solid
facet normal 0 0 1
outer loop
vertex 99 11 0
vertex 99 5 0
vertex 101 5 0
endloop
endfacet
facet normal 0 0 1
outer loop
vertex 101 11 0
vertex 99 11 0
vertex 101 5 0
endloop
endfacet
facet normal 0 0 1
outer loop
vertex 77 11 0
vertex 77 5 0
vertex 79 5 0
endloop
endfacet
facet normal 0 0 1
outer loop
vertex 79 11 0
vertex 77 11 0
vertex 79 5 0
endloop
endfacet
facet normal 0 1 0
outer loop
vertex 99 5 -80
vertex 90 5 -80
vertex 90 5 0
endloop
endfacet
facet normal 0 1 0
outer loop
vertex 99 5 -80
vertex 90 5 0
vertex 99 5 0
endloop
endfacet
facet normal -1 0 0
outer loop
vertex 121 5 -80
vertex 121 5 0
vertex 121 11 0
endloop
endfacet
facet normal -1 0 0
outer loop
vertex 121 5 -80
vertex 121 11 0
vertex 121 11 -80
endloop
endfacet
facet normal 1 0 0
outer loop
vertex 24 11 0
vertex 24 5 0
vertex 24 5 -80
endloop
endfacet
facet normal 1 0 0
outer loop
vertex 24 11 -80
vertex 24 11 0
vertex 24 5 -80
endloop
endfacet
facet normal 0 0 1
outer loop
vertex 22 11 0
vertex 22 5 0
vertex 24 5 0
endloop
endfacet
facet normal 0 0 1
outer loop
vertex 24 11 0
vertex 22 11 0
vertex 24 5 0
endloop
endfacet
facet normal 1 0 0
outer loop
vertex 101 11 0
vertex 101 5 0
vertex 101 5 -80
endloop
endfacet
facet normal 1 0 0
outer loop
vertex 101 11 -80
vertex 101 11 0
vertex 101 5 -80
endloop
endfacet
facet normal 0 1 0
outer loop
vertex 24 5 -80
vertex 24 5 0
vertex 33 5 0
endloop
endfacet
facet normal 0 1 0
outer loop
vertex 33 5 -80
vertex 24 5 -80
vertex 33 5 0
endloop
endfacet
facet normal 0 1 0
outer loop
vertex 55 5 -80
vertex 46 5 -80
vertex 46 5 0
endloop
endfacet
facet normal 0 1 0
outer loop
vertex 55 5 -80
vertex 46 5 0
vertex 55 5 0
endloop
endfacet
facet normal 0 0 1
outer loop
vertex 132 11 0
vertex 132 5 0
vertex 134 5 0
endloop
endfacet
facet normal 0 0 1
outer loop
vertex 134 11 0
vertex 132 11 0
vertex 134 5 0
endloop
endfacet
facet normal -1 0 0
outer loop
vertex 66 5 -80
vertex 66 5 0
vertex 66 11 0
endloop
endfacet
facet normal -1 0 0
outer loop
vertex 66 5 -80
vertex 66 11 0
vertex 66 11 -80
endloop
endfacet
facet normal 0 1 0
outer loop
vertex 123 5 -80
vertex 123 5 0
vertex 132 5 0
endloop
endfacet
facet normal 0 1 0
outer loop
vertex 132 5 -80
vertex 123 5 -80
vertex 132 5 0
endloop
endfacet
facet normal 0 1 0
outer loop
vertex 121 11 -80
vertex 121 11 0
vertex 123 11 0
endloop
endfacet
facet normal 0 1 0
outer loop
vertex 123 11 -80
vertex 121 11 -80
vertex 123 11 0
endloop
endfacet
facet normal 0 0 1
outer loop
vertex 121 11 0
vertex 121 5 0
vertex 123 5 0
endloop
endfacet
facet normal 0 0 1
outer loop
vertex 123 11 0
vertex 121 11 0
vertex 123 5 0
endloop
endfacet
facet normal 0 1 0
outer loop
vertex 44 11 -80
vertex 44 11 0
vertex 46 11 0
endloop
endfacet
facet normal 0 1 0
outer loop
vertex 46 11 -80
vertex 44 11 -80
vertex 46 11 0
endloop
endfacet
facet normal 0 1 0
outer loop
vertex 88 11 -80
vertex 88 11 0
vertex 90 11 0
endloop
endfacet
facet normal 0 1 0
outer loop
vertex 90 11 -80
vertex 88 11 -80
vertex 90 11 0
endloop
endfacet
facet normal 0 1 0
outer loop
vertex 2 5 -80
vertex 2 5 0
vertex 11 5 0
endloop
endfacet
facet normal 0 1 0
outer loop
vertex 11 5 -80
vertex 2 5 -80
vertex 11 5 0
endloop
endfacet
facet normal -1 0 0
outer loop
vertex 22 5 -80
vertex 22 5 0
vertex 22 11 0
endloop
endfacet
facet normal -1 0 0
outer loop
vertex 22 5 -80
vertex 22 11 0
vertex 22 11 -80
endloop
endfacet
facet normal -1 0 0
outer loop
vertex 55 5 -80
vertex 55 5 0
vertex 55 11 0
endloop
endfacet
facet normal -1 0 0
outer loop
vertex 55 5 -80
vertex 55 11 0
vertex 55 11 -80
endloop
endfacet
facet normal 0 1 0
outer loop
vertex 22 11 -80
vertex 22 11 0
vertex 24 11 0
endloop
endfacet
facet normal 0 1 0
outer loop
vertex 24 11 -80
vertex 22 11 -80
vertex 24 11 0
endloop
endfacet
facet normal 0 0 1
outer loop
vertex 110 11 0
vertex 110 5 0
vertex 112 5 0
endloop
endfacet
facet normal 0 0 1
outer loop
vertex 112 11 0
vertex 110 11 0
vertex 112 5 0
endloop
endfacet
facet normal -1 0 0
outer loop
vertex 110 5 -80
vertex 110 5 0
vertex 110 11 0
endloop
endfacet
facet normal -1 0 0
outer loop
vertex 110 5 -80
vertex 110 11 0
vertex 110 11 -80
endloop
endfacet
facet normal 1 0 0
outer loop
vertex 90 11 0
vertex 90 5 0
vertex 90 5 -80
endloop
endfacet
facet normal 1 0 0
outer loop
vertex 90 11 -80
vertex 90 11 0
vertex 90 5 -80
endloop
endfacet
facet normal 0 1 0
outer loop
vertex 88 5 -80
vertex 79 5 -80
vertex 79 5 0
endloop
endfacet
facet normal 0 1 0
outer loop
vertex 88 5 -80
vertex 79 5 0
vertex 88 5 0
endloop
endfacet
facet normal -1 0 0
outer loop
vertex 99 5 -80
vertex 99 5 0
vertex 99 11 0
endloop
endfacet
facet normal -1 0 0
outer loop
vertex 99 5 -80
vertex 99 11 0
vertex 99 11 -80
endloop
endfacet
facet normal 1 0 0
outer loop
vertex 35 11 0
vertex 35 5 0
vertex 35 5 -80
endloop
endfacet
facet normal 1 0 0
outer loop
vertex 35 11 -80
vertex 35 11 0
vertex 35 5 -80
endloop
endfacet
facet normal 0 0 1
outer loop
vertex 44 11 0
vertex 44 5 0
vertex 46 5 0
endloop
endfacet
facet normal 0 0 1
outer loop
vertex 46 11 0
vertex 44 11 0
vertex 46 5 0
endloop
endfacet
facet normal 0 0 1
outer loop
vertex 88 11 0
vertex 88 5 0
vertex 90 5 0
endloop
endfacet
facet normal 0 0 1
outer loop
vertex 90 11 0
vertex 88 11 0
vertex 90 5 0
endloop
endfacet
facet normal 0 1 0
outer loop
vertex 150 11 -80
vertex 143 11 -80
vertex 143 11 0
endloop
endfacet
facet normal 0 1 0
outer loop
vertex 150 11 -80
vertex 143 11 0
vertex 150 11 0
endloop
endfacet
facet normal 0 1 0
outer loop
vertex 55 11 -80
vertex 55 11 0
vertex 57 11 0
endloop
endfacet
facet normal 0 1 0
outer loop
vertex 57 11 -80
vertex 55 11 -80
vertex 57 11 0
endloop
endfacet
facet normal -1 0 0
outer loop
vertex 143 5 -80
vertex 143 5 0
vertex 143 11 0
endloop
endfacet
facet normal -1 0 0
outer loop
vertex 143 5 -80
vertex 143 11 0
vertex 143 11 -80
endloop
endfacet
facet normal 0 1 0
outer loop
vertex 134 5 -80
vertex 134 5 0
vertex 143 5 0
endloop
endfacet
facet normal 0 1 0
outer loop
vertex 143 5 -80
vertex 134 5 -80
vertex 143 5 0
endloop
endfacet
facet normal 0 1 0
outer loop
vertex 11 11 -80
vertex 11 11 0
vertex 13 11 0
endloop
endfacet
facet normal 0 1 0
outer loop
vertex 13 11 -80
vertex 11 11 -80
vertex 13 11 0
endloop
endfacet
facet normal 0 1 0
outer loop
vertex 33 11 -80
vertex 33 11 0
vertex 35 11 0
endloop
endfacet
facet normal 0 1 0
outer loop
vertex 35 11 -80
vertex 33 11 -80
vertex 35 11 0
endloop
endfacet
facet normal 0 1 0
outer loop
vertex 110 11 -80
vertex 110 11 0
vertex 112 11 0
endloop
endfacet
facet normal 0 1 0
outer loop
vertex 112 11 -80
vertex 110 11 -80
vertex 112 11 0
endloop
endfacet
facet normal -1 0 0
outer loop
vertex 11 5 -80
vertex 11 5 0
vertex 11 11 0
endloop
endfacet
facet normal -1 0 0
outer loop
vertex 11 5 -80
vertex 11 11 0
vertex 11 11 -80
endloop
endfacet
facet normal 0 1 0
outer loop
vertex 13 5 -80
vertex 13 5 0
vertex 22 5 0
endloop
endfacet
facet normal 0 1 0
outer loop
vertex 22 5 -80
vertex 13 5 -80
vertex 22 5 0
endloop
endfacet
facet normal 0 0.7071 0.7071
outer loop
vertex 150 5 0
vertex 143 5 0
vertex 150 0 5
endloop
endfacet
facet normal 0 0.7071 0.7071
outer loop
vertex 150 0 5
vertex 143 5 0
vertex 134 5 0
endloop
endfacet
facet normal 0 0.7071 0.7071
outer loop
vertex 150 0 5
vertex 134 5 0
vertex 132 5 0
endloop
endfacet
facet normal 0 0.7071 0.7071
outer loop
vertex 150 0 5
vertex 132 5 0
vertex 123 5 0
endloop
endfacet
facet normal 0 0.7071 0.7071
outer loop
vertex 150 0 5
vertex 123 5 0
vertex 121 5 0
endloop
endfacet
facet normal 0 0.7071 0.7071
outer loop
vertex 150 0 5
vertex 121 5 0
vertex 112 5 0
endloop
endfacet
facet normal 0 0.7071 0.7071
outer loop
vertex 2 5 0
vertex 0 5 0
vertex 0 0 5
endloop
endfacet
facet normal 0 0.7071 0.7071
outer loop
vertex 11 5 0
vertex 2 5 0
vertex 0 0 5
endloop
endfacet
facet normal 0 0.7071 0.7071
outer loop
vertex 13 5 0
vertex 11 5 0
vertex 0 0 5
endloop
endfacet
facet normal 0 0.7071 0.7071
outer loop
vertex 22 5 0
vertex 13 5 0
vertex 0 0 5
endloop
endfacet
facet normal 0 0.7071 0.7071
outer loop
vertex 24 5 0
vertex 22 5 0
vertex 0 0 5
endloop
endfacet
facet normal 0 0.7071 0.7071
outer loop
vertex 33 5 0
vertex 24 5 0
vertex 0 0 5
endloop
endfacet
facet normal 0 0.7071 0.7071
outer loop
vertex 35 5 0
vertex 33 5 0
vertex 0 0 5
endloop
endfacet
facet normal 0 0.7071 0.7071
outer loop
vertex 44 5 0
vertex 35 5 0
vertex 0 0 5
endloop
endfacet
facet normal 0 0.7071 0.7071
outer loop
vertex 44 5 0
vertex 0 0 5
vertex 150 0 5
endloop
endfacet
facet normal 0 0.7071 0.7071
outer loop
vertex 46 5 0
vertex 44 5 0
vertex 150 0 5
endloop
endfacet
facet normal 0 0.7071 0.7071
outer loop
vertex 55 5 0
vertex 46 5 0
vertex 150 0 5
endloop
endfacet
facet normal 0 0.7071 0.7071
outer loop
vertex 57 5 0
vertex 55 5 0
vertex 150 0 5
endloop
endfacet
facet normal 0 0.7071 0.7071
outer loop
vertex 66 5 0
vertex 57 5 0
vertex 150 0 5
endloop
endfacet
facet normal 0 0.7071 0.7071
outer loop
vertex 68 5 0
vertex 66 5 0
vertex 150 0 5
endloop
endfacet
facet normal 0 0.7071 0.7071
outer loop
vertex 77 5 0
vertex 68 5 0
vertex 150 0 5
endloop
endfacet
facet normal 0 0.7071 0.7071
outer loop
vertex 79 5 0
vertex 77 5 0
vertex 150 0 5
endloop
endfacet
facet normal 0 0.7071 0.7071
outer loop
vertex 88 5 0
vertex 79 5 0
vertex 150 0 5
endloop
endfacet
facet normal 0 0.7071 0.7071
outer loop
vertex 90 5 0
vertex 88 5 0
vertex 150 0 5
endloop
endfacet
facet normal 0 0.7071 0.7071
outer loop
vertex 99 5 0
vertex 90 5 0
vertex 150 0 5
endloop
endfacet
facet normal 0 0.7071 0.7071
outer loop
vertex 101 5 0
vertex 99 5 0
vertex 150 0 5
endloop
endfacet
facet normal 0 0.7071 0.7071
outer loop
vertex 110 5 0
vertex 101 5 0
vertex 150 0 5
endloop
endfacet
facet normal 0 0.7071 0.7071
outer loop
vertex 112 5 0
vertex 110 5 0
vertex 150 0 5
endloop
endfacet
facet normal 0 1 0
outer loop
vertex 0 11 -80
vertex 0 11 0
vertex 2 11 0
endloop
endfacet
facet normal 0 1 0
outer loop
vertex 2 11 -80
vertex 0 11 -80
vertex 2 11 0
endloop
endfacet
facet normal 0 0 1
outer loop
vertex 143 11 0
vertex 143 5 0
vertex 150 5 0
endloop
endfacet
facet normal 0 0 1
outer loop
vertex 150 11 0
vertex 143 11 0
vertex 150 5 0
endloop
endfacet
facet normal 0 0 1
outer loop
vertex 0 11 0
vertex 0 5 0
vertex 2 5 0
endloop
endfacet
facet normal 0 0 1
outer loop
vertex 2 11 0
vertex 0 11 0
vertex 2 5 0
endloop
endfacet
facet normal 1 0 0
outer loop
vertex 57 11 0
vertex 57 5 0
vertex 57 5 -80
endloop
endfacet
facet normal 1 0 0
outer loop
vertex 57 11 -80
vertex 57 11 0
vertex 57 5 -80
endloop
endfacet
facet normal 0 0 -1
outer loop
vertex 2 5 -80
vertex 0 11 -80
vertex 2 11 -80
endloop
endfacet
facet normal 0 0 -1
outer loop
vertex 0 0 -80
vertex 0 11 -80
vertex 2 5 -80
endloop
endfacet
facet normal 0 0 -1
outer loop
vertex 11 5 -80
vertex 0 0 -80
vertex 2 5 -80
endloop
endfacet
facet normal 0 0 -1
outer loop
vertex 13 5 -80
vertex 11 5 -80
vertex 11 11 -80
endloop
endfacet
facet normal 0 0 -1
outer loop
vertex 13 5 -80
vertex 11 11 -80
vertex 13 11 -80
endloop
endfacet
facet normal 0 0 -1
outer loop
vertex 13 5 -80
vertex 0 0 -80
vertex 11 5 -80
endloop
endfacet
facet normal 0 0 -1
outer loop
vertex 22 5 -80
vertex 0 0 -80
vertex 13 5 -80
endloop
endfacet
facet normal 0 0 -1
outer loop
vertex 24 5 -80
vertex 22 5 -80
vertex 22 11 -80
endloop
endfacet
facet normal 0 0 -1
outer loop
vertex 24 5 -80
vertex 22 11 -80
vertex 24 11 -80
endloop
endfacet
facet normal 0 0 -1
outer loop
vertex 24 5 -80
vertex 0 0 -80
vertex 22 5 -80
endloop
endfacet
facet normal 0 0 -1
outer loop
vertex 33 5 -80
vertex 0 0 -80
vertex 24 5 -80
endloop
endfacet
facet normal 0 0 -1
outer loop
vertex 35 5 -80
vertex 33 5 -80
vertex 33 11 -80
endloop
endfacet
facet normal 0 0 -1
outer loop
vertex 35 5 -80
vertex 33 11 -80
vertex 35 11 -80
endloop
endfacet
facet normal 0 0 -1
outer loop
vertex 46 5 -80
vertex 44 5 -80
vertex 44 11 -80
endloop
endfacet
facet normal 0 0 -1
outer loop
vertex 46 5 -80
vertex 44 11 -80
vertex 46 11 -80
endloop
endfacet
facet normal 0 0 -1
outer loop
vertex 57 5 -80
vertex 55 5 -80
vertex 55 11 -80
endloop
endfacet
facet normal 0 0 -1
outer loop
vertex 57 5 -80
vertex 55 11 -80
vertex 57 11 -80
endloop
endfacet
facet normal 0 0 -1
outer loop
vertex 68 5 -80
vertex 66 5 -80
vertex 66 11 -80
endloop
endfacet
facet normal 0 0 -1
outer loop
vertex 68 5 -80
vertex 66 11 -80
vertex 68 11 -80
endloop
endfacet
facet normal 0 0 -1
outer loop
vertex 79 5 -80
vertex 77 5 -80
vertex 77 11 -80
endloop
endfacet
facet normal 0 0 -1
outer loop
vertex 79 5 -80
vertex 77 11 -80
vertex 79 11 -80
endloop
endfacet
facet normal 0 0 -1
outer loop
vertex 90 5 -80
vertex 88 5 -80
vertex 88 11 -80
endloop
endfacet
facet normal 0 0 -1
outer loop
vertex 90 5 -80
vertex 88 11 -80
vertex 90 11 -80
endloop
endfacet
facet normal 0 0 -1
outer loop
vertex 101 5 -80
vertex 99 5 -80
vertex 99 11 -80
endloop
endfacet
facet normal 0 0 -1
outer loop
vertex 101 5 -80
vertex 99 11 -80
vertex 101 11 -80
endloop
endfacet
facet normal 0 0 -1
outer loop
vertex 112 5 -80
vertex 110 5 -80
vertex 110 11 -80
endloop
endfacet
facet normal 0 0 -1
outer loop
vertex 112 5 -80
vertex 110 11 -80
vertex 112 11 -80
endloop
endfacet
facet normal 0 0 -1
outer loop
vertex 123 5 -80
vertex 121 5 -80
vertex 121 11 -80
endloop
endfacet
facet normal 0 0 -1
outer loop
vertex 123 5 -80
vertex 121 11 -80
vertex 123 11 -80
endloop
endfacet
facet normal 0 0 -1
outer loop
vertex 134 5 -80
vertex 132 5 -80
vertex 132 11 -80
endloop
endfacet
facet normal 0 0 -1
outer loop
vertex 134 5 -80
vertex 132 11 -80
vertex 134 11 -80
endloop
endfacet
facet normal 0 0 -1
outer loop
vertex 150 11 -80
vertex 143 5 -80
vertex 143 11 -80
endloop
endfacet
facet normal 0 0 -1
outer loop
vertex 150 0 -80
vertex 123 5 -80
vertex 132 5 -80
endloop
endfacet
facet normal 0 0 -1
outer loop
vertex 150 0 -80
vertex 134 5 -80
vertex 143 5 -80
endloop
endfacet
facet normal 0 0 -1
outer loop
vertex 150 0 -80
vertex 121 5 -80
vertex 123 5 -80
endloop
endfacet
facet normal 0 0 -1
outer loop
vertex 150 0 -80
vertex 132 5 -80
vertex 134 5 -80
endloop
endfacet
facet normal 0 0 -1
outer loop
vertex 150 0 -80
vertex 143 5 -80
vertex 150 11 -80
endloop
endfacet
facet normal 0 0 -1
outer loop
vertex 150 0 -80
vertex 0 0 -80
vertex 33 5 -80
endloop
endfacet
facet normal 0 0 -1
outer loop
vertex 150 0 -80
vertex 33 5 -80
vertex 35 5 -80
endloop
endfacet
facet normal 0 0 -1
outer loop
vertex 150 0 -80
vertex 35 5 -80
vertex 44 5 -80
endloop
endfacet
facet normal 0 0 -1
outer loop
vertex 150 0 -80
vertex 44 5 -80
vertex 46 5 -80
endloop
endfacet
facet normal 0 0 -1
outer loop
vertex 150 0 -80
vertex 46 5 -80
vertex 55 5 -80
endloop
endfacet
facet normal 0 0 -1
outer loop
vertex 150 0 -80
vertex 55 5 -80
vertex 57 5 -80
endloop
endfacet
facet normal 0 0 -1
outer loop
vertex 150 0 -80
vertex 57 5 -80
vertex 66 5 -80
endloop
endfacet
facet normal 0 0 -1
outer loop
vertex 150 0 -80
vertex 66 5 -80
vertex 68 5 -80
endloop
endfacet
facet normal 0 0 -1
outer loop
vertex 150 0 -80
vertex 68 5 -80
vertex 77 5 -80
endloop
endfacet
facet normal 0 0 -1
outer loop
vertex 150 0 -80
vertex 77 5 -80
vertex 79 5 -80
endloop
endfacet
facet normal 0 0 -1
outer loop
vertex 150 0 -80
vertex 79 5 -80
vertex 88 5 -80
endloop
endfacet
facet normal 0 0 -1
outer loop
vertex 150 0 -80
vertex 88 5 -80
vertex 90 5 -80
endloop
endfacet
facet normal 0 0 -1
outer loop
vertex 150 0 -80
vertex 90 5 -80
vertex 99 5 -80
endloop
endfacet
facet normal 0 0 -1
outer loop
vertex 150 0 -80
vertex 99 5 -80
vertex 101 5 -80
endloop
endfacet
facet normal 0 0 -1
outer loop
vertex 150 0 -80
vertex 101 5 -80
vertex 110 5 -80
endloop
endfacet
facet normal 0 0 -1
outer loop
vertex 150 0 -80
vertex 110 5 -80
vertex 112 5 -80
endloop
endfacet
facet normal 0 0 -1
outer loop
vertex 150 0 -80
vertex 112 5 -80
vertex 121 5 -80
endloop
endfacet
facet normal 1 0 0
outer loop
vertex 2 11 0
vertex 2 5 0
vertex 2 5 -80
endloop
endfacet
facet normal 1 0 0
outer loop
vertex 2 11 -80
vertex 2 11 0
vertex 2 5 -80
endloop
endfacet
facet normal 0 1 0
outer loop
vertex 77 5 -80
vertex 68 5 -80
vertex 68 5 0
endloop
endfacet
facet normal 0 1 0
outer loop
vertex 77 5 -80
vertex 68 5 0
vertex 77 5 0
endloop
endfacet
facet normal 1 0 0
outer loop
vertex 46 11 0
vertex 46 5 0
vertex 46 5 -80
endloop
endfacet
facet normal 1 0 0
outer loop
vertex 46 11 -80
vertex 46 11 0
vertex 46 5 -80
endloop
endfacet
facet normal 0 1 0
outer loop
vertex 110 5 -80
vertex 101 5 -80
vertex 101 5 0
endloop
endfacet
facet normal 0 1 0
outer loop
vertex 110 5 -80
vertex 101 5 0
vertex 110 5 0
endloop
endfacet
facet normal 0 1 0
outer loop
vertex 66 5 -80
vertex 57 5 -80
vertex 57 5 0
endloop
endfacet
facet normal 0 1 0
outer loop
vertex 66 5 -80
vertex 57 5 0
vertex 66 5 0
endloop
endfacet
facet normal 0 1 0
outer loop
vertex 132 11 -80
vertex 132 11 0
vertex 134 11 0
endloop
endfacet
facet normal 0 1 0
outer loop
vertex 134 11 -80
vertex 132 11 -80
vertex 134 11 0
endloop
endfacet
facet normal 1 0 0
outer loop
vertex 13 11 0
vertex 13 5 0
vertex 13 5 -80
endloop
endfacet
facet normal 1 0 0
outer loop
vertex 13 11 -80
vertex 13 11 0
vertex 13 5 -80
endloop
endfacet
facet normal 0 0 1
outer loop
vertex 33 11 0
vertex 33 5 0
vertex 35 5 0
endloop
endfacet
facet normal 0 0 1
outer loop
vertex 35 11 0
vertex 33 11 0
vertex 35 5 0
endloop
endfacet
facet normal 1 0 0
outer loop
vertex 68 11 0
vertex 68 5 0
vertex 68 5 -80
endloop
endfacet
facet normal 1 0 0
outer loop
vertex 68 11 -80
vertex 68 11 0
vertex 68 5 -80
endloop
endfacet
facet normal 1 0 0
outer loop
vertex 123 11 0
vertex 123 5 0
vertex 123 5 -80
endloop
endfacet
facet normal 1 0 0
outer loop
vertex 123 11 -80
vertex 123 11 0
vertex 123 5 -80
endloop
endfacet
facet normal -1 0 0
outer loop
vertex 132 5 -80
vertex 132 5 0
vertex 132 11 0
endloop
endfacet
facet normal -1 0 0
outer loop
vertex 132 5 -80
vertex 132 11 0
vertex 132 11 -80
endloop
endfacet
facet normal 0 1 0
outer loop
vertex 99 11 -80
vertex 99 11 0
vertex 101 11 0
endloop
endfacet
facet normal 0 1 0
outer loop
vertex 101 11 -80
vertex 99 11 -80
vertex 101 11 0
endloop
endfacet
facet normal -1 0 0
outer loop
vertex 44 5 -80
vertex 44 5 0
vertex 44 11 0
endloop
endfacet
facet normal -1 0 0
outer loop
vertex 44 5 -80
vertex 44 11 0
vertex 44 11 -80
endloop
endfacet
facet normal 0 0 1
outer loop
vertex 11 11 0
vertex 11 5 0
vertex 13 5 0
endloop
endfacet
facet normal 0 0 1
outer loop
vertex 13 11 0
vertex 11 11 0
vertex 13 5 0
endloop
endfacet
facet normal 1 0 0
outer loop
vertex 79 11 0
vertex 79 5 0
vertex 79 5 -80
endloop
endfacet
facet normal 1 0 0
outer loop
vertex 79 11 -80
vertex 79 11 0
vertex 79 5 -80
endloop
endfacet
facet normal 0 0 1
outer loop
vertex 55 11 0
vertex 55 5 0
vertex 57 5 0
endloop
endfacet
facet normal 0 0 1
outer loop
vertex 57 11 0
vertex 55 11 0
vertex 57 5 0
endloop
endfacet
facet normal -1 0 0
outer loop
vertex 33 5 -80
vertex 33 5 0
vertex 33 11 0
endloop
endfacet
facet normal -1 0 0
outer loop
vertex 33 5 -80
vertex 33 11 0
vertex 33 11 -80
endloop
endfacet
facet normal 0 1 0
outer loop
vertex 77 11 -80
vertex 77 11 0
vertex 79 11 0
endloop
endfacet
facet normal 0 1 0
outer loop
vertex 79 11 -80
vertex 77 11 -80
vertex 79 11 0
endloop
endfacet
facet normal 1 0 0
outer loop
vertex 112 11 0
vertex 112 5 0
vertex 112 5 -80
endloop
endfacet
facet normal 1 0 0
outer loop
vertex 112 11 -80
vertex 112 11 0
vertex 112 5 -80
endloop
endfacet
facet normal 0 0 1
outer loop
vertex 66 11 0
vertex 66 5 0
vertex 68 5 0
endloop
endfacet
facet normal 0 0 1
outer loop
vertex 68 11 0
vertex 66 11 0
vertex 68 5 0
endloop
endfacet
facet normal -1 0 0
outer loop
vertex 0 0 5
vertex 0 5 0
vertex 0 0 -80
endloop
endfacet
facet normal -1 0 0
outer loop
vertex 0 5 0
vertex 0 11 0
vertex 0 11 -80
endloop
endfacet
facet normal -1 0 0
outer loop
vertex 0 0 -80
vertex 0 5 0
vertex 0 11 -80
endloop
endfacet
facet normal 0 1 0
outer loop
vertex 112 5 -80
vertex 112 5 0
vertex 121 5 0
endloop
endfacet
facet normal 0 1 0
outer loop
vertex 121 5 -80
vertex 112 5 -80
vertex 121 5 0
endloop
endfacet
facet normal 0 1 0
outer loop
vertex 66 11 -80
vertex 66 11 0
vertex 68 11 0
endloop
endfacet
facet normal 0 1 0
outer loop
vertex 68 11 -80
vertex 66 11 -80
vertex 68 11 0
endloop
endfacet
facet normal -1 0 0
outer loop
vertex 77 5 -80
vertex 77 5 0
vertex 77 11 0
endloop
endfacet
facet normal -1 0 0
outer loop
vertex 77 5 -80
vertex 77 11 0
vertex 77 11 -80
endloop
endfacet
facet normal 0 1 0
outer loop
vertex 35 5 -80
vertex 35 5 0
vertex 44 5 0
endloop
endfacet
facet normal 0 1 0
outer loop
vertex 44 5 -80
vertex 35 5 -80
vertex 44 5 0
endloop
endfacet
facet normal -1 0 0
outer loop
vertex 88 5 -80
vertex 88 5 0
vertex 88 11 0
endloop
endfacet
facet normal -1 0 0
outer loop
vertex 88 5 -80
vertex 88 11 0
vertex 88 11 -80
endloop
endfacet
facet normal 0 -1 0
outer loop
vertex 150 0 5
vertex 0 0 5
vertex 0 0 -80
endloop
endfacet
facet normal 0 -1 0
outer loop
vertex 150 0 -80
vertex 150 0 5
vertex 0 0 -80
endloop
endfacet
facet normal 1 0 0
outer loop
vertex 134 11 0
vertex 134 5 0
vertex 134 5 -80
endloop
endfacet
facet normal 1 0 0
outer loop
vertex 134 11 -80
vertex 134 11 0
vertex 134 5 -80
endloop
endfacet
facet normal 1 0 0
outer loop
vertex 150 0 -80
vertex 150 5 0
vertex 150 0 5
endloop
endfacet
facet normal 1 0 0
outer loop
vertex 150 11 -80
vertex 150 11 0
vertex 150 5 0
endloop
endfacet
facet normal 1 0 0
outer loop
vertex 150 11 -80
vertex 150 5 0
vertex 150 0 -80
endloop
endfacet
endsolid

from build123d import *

# Parameters (mm, degrees)
SKETCH1_W           = 150
SKETCH1_H           = 80
BOSS_EXTRUDE1_DEPTH = 5
SKETCH2_W           = 2
SKETCH2_H           = 80
SKETCH2_W_2         = 7
BOSS_EXTRUDE2_DEPTH = 6
BOSS_EXTRUDE3_REACH = 172.356


with BuildPart() as part:
    # Sketch1 → Boss-Extrude1 (new body)
    with BuildSketch(Plane(origin=(0, 0, 0), x_dir=(1, 0, 0), z_dir=(0, 1, 0))):
        with Locations((75, 40)):
            Rectangle(SKETCH1_W, SKETCH1_H)
    extrude(amount=BOSS_EXTRUDE1_DEPTH)

    # Sketch2 → Boss-Extrude2 (add)
    with BuildSketch(Plane(origin=(0, 5, 0), x_dir=(1, 0, 0), z_dir=(0, 1, 0))):
        with Locations((1, 40)):
            Rectangle(SKETCH2_W, SKETCH2_H)
        with Locations((12, 40)):
            Rectangle(SKETCH2_W, SKETCH2_H)
        with Locations((23, 40)):
            Rectangle(SKETCH2_W, SKETCH2_H)
        with Locations((34, 40)):
            Rectangle(SKETCH2_W, SKETCH2_H)
        with Locations((45, 40)):
            Rectangle(SKETCH2_W, SKETCH2_H)
        with Locations((56, 40)):
            Rectangle(SKETCH2_W, SKETCH2_H)
        with Locations((67, 40)):
            Rectangle(SKETCH2_W, SKETCH2_H)
        with Locations((78, 40)):
            Rectangle(SKETCH2_W, SKETCH2_H)
        with Locations((89, 40)):
            Rectangle(SKETCH2_W, SKETCH2_H)
        with Locations((100, 40)):
            Rectangle(SKETCH2_W, SKETCH2_H)
        with Locations((111, 40)):
            Rectangle(SKETCH2_W, SKETCH2_H)
        with Locations((122, 40)):
            Rectangle(SKETCH2_W, SKETCH2_H)
        with Locations((133, 40)):
            Rectangle(SKETCH2_W, SKETCH2_H)
        with Locations((146.5, 40)):
            Rectangle(SKETCH2_W_2, SKETCH2_H)
    extrude(amount=BOSS_EXTRUDE2_DEPTH)

    # Boss-Extrude3: up to this face of the body (flat: up to its plane)
    boss_extrude3_end = Plane(part.part.faces().sort_by_distance((150, 5.5, -40))[0])
    # Sketch3 → Boss-Extrude3 (add, up to the picked face)
    with BuildSketch(Plane.ZY, mode=Mode.PRIVATE) as boss_extrude3_sk1:
        Polygon((0, 0), (0, 5), (5, 0), align=None)
    boss_extrude3_tool1 = split(extrude(boss_extrude3_sk1.sketch, amount=-BOSS_EXTRUDE3_REACH, mode=Mode.PRIVATE), bisect_by=boss_extrude3_end, keep=Keep.BOTH, mode=Mode.PRIVATE)
    add(boss_extrude3_tool1.solids().sort_by(Axis((0, 1.666667, 1.666667), (1, 0, 0)))[0])


solid = part.part
